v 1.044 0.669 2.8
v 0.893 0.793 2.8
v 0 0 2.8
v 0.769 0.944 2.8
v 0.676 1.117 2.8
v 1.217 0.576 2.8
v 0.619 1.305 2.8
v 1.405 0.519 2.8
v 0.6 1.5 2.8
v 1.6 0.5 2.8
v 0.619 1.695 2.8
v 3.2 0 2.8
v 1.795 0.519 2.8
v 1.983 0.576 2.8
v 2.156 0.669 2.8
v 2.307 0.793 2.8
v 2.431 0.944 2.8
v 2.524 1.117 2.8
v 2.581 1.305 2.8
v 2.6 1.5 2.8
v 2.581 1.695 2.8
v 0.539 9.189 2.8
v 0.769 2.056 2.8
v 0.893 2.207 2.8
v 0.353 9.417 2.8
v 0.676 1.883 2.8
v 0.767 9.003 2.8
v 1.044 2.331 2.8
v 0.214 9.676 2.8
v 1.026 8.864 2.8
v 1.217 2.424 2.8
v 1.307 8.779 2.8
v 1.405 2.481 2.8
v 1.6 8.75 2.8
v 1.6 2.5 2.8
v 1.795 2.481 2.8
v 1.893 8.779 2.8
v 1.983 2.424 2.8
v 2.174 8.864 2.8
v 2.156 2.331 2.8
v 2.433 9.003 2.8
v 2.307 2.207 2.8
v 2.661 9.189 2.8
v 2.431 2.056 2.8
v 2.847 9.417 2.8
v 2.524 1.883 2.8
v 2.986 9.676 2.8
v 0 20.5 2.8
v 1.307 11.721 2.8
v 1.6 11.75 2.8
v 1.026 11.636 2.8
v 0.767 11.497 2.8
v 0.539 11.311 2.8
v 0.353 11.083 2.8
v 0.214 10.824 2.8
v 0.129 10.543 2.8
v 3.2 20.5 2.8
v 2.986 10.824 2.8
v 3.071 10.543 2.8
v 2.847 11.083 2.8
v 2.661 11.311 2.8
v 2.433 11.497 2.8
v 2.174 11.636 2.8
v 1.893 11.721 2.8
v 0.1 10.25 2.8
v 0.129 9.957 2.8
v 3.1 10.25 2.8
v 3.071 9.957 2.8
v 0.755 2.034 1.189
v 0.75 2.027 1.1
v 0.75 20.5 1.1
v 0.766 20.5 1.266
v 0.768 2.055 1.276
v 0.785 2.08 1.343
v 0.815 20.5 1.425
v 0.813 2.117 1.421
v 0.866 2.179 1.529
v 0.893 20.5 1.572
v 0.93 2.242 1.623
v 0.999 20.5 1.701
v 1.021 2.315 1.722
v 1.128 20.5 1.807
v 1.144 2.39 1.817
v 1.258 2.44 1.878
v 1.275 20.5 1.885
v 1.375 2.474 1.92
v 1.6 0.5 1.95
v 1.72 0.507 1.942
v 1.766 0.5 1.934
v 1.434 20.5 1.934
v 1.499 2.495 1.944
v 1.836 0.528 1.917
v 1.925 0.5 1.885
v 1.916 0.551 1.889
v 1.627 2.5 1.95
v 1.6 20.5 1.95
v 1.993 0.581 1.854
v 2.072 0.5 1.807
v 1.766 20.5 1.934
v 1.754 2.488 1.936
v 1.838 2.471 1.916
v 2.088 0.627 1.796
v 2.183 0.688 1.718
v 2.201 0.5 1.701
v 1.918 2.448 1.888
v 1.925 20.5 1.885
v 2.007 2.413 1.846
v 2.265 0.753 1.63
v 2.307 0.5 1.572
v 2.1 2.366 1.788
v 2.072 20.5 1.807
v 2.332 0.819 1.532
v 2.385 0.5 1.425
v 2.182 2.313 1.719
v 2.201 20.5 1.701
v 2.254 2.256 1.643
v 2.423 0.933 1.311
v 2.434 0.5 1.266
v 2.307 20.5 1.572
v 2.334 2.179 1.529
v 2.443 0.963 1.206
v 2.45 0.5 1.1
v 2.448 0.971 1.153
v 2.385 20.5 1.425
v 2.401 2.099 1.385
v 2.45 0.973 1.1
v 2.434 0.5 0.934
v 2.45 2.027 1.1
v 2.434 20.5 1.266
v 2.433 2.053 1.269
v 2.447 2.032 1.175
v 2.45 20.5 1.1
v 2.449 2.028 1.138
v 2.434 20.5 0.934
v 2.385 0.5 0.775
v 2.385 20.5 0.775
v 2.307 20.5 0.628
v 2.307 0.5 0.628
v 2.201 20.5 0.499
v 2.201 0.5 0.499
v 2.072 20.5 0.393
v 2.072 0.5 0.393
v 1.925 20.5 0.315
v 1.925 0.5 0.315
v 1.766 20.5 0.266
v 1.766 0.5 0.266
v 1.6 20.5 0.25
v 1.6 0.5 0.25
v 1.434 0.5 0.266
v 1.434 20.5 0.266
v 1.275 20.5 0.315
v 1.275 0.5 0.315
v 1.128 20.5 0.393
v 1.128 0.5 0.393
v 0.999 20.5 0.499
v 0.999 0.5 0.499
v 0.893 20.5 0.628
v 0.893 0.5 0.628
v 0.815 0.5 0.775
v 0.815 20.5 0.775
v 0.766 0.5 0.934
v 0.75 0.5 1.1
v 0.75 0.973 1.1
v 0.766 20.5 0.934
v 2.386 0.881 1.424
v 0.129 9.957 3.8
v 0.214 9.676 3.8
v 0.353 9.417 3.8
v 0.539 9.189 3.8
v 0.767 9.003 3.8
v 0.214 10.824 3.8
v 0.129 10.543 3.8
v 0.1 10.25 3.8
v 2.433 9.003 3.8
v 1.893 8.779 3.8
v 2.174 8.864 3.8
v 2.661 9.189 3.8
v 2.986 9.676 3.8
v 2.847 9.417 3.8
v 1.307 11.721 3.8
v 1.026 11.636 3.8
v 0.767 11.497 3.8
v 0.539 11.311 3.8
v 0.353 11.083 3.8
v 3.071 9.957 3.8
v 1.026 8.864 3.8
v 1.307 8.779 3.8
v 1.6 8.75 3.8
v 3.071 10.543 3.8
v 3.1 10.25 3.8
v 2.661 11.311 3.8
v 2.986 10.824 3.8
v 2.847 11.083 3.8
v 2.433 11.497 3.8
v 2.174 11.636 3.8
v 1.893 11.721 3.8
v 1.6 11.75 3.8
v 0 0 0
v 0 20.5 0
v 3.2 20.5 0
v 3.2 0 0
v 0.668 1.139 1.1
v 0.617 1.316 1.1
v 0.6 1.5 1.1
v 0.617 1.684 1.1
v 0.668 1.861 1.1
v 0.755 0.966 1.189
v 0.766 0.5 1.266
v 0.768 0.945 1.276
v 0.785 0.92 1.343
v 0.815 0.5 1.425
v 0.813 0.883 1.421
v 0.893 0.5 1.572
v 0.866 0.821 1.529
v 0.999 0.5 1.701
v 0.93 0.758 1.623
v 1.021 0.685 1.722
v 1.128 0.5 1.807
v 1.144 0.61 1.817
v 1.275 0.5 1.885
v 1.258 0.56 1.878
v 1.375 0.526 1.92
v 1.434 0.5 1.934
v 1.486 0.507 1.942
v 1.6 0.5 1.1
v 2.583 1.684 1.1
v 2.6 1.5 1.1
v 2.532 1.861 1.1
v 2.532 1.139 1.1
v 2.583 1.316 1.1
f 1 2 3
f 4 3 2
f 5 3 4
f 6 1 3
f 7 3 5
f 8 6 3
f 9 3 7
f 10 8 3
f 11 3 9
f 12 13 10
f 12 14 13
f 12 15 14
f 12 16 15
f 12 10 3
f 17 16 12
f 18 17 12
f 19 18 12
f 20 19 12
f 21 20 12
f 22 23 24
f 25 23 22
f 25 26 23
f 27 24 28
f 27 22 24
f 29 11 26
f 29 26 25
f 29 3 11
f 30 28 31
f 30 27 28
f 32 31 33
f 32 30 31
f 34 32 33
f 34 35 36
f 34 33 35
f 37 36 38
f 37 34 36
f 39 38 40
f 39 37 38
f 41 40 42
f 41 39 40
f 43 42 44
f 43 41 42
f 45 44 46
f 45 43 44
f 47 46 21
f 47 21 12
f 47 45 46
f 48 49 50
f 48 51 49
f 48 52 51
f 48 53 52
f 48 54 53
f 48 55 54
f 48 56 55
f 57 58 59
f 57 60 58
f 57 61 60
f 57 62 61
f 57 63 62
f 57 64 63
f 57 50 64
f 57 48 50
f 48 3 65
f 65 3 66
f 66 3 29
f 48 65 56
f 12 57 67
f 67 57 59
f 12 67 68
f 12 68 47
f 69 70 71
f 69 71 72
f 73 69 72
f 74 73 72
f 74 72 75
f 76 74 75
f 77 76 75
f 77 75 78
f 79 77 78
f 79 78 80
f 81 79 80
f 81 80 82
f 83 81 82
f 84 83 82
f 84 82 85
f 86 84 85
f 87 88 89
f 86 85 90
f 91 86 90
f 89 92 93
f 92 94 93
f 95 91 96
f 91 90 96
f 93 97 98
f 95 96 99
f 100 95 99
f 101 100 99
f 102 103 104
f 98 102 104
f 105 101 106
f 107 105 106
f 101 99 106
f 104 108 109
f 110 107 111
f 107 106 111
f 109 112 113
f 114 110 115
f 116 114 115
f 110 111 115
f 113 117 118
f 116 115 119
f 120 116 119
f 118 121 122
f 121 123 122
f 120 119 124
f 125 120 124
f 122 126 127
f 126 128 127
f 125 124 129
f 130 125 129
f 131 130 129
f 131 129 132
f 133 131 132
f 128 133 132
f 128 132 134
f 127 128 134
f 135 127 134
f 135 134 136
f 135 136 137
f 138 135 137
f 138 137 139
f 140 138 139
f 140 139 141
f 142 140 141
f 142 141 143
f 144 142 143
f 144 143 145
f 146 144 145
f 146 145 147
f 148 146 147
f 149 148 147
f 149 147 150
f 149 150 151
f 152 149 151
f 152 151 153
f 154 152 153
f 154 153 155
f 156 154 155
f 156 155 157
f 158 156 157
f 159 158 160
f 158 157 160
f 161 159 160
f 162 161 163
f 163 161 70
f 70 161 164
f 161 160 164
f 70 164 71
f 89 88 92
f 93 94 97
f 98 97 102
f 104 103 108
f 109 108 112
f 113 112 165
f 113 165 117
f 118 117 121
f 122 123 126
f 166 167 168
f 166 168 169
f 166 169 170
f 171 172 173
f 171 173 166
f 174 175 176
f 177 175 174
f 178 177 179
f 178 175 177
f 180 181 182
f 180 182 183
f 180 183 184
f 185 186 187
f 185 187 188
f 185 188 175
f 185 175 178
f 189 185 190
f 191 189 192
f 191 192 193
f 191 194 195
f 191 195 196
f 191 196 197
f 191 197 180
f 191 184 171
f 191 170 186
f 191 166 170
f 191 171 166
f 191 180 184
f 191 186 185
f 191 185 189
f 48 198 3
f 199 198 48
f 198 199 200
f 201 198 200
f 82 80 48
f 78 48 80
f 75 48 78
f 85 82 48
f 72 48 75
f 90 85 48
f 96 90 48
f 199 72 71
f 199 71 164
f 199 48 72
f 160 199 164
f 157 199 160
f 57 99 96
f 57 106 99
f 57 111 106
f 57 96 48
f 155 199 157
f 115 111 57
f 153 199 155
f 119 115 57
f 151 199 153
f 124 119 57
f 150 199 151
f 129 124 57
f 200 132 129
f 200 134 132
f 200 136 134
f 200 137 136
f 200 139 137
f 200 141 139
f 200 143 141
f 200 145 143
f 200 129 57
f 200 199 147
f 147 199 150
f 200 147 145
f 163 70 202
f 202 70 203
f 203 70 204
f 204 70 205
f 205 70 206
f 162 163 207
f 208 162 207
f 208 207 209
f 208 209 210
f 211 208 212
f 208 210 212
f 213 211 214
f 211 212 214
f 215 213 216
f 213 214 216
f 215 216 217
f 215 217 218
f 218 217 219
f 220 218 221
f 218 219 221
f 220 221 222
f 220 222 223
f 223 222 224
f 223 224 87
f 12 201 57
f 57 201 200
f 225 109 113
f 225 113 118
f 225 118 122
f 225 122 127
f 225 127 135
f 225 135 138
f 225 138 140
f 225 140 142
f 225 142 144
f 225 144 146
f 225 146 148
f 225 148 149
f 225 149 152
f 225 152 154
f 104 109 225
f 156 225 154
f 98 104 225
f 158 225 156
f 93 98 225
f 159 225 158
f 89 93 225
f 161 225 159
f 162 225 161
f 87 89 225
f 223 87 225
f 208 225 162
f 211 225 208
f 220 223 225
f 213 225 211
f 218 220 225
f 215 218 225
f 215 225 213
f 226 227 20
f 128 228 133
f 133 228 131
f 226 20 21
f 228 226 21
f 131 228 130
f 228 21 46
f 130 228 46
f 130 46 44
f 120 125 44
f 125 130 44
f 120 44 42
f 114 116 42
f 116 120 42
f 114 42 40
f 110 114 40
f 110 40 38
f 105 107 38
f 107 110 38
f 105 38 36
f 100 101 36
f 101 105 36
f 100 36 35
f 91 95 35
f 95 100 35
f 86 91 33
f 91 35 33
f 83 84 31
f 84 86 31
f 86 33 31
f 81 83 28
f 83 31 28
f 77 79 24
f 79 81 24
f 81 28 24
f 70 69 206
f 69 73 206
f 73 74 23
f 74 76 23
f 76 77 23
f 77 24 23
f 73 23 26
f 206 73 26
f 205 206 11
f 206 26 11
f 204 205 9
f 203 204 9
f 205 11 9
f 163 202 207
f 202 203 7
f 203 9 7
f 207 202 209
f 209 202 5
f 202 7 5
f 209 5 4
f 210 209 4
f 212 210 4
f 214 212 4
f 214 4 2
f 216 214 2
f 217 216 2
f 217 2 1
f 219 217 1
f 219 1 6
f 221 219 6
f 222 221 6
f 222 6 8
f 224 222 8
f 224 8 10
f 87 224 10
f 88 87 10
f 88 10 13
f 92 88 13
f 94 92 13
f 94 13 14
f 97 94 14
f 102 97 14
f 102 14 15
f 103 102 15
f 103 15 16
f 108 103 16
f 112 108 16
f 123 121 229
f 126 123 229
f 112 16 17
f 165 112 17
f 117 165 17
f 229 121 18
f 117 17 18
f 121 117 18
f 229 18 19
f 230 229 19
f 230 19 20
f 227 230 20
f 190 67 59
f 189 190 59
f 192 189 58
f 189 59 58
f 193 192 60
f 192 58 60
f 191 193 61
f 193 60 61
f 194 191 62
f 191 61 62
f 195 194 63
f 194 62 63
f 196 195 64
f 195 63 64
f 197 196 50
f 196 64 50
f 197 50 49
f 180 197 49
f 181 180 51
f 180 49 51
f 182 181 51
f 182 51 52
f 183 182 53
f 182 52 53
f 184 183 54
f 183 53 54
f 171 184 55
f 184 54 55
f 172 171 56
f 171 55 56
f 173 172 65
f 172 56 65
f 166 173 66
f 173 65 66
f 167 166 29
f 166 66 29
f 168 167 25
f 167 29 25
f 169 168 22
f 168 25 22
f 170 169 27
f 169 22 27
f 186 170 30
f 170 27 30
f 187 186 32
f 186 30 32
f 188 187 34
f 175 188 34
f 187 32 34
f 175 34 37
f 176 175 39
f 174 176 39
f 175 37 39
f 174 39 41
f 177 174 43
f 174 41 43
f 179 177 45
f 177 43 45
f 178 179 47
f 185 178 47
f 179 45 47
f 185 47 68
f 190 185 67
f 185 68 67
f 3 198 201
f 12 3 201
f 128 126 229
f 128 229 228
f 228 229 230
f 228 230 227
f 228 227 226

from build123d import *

# Parameters (mm, degrees)
F0_W     = 3.2
F0_H     = 20.5
F1_DEPTH = 2.8
F2_R     = 0.85
F3_DEPTH = 20
F4_R     = 1
F5_DEPTH = 1.7
F6_R     = 1.5
F7_DEPTH = 1


with BuildPart() as f1:
    # F0 (on Top) → F1 (new body)
    with BuildSketch(Plane.XY):
        with Locations((1.6, 10.25)):
            Rectangle(F0_W, F0_H)
    extrude(amount=F1_DEPTH)

    # F2 (on face) → F3 (cut)
    with BuildSketch(Plane(origin=(0, 20.5, 0), x_dir=(-1, 0, 0), z_dir=(0, 1, 0))):
        with Locations((-1.6, 1.1)):
            Circle(F2_R)
    extrude(amount=-F3_DEPTH, mode=Mode.SUBTRACT)

    # F4 (on face) → F5 (cut)
    with BuildSketch(Plane.XY.offset(2.8)):
        with Locations((1.6, 1.5)):
            Circle(F4_R)
    extrude(amount=-F5_DEPTH, mode=Mode.SUBTRACT)

    # F6 (on face) → F7 (join)
    with BuildSketch(Plane.XY.offset(2.8)):
        with Locations((1.6, 10.25)):
            Circle(F6_R)
    extrude(amount=F7_DEPTH)


solid = f1.part
